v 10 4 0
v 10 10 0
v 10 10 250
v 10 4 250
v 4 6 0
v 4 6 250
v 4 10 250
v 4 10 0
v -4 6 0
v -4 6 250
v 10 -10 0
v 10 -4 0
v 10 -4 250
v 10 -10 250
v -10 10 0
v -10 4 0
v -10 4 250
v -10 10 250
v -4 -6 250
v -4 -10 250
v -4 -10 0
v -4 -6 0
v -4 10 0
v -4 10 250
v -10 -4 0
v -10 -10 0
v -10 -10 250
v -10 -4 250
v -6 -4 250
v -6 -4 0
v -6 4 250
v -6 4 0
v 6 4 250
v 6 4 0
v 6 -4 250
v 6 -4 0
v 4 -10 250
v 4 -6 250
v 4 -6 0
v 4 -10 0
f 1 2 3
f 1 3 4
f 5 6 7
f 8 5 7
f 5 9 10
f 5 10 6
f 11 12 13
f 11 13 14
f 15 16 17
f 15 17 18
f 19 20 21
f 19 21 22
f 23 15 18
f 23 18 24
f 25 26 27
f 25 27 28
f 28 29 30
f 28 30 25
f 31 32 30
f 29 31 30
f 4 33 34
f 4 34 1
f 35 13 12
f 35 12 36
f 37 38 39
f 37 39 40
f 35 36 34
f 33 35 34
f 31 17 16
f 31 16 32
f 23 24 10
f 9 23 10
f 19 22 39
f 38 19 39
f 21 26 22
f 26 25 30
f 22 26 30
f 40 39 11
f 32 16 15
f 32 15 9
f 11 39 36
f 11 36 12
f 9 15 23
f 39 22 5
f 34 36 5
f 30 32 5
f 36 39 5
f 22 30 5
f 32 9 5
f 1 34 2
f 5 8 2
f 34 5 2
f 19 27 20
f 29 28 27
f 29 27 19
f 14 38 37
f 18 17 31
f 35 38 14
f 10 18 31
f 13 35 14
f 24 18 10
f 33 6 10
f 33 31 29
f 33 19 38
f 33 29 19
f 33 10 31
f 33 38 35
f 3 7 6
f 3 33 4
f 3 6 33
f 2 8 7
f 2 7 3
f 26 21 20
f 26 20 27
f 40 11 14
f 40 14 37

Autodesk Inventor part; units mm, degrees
ref_plane "YZ Plane" through (0, 0, 0) normal (1, 0, 0) x (0, 1, 0)
ref_plane "XZ Plane" through (0, 0, 0) normal (0, 1, 0) x (-1, 0, 0)
ref_plane "XY Plane" through (0, 0, 0) normal (0, 0, 1) x (1, 0, 0)
sketch "Sketch1" plane through (0, 0, 0) normal (0, 0, 1) x (1, 0, 0)
  line L0 (10, -10) -> (-10, 10) construction
  line L1 (-10, -10) -> (10, 10) construction
  line L2 (-4, 6) -> (4, 6)
  line L3 (4, 6) -> (4, 14)
  line L4 (4, 14) -> (-4, 14)
  line L5 (-4, 14) -> (-4, 6)
  line L6 (-4, 6) -> (4, 14) construction
  line L7 (4, 6) -> (-4, 14) construction
  line L8 (14, -4) -> (6, -4)
  line L9 (6, -4) -> (6, 4)
  line L10 (6, 4) -> (14, 4)
  line L11 (14, 4) -> (14, -4)
  line L12 (14, -4) -> (6, 4) construction
  line L13 (6, -4) -> (14, 4) construction
  line L14 (-4, -6) -> (4, -6)
  line L15 (4, -6) -> (4, -14)
  line L16 (4, -14) -> (-4, -14)
  line L17 (-4, -14) -> (-4, -6)
  line L18 (-4, -6) -> (4, -14) construction
  line L19 (4, -6) -> (-4, -14) construction
  line L20 (-14, 4) -> (-6, 4)
  line L21 (-6, 4) -> (-6, -4)
  line L22 (-6, -4) -> (-14, -4)
  line L23 (-14, -4) -> (-14, 4)
  line L24 (-14, 4) -> (-6, -4) construction
  line L25 (-6, 4) -> (-14, -4) construction
  line L26 (-10, -10) -> (-10, 0)
  line L27 (-10, 4) -> (-10, 10)
  line L28 (-10, 10) -> (0, 10)
  line L29 (4, 10) -> (10, 10)
  line L30 (10, 10) -> (10, 4)
  line L31 (10, 0) -> (10, -10)
  line L32 (10, -10) -> (4, -10)
  line L33 (0, -10) -> (-10, -10)
  point P0 (0, 0)
  point P1 (-4, 10)
  point P2 (10, -4)
  point P3 (-4, -10)
  point P4 (-10, -4)
  dimension "d0" = 20
  dimension "d1" = 20
  dimension "d2" = 8
  dimension "d3" = 8
  dimension "d4" = 8
  dimension "d5" = 8
  dimension "d6" = 8
  dimension "d7" = 8
  dimension "d8" = 8
  dimension "d9" = 8
extrude "Extrusion1" add sketch "Sketch1" along normal blind 250 contours L2 L3 L29 L30 L10 L9 L8 L31 L32 L15 L14 L17 L33 L26 L22 L21 L20 L27 L28 L5
ref_plane "Work Plane1" through (4, 0, 0) normal (0, 1, 0) x (1, 0, 0)
ref_plane "Work Plane2" through (0, -10, 0) normal (1, 0, 0) x (0, 0, -1)
properties part number "Neje_Base_Rod_20mm"
